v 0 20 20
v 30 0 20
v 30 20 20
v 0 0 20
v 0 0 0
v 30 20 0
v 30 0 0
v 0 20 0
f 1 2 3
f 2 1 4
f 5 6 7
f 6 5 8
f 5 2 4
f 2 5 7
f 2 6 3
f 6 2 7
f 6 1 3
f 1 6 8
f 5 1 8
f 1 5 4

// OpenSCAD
// Generated by generate_scads.py
cube(size=[30,20,20], center=false);
